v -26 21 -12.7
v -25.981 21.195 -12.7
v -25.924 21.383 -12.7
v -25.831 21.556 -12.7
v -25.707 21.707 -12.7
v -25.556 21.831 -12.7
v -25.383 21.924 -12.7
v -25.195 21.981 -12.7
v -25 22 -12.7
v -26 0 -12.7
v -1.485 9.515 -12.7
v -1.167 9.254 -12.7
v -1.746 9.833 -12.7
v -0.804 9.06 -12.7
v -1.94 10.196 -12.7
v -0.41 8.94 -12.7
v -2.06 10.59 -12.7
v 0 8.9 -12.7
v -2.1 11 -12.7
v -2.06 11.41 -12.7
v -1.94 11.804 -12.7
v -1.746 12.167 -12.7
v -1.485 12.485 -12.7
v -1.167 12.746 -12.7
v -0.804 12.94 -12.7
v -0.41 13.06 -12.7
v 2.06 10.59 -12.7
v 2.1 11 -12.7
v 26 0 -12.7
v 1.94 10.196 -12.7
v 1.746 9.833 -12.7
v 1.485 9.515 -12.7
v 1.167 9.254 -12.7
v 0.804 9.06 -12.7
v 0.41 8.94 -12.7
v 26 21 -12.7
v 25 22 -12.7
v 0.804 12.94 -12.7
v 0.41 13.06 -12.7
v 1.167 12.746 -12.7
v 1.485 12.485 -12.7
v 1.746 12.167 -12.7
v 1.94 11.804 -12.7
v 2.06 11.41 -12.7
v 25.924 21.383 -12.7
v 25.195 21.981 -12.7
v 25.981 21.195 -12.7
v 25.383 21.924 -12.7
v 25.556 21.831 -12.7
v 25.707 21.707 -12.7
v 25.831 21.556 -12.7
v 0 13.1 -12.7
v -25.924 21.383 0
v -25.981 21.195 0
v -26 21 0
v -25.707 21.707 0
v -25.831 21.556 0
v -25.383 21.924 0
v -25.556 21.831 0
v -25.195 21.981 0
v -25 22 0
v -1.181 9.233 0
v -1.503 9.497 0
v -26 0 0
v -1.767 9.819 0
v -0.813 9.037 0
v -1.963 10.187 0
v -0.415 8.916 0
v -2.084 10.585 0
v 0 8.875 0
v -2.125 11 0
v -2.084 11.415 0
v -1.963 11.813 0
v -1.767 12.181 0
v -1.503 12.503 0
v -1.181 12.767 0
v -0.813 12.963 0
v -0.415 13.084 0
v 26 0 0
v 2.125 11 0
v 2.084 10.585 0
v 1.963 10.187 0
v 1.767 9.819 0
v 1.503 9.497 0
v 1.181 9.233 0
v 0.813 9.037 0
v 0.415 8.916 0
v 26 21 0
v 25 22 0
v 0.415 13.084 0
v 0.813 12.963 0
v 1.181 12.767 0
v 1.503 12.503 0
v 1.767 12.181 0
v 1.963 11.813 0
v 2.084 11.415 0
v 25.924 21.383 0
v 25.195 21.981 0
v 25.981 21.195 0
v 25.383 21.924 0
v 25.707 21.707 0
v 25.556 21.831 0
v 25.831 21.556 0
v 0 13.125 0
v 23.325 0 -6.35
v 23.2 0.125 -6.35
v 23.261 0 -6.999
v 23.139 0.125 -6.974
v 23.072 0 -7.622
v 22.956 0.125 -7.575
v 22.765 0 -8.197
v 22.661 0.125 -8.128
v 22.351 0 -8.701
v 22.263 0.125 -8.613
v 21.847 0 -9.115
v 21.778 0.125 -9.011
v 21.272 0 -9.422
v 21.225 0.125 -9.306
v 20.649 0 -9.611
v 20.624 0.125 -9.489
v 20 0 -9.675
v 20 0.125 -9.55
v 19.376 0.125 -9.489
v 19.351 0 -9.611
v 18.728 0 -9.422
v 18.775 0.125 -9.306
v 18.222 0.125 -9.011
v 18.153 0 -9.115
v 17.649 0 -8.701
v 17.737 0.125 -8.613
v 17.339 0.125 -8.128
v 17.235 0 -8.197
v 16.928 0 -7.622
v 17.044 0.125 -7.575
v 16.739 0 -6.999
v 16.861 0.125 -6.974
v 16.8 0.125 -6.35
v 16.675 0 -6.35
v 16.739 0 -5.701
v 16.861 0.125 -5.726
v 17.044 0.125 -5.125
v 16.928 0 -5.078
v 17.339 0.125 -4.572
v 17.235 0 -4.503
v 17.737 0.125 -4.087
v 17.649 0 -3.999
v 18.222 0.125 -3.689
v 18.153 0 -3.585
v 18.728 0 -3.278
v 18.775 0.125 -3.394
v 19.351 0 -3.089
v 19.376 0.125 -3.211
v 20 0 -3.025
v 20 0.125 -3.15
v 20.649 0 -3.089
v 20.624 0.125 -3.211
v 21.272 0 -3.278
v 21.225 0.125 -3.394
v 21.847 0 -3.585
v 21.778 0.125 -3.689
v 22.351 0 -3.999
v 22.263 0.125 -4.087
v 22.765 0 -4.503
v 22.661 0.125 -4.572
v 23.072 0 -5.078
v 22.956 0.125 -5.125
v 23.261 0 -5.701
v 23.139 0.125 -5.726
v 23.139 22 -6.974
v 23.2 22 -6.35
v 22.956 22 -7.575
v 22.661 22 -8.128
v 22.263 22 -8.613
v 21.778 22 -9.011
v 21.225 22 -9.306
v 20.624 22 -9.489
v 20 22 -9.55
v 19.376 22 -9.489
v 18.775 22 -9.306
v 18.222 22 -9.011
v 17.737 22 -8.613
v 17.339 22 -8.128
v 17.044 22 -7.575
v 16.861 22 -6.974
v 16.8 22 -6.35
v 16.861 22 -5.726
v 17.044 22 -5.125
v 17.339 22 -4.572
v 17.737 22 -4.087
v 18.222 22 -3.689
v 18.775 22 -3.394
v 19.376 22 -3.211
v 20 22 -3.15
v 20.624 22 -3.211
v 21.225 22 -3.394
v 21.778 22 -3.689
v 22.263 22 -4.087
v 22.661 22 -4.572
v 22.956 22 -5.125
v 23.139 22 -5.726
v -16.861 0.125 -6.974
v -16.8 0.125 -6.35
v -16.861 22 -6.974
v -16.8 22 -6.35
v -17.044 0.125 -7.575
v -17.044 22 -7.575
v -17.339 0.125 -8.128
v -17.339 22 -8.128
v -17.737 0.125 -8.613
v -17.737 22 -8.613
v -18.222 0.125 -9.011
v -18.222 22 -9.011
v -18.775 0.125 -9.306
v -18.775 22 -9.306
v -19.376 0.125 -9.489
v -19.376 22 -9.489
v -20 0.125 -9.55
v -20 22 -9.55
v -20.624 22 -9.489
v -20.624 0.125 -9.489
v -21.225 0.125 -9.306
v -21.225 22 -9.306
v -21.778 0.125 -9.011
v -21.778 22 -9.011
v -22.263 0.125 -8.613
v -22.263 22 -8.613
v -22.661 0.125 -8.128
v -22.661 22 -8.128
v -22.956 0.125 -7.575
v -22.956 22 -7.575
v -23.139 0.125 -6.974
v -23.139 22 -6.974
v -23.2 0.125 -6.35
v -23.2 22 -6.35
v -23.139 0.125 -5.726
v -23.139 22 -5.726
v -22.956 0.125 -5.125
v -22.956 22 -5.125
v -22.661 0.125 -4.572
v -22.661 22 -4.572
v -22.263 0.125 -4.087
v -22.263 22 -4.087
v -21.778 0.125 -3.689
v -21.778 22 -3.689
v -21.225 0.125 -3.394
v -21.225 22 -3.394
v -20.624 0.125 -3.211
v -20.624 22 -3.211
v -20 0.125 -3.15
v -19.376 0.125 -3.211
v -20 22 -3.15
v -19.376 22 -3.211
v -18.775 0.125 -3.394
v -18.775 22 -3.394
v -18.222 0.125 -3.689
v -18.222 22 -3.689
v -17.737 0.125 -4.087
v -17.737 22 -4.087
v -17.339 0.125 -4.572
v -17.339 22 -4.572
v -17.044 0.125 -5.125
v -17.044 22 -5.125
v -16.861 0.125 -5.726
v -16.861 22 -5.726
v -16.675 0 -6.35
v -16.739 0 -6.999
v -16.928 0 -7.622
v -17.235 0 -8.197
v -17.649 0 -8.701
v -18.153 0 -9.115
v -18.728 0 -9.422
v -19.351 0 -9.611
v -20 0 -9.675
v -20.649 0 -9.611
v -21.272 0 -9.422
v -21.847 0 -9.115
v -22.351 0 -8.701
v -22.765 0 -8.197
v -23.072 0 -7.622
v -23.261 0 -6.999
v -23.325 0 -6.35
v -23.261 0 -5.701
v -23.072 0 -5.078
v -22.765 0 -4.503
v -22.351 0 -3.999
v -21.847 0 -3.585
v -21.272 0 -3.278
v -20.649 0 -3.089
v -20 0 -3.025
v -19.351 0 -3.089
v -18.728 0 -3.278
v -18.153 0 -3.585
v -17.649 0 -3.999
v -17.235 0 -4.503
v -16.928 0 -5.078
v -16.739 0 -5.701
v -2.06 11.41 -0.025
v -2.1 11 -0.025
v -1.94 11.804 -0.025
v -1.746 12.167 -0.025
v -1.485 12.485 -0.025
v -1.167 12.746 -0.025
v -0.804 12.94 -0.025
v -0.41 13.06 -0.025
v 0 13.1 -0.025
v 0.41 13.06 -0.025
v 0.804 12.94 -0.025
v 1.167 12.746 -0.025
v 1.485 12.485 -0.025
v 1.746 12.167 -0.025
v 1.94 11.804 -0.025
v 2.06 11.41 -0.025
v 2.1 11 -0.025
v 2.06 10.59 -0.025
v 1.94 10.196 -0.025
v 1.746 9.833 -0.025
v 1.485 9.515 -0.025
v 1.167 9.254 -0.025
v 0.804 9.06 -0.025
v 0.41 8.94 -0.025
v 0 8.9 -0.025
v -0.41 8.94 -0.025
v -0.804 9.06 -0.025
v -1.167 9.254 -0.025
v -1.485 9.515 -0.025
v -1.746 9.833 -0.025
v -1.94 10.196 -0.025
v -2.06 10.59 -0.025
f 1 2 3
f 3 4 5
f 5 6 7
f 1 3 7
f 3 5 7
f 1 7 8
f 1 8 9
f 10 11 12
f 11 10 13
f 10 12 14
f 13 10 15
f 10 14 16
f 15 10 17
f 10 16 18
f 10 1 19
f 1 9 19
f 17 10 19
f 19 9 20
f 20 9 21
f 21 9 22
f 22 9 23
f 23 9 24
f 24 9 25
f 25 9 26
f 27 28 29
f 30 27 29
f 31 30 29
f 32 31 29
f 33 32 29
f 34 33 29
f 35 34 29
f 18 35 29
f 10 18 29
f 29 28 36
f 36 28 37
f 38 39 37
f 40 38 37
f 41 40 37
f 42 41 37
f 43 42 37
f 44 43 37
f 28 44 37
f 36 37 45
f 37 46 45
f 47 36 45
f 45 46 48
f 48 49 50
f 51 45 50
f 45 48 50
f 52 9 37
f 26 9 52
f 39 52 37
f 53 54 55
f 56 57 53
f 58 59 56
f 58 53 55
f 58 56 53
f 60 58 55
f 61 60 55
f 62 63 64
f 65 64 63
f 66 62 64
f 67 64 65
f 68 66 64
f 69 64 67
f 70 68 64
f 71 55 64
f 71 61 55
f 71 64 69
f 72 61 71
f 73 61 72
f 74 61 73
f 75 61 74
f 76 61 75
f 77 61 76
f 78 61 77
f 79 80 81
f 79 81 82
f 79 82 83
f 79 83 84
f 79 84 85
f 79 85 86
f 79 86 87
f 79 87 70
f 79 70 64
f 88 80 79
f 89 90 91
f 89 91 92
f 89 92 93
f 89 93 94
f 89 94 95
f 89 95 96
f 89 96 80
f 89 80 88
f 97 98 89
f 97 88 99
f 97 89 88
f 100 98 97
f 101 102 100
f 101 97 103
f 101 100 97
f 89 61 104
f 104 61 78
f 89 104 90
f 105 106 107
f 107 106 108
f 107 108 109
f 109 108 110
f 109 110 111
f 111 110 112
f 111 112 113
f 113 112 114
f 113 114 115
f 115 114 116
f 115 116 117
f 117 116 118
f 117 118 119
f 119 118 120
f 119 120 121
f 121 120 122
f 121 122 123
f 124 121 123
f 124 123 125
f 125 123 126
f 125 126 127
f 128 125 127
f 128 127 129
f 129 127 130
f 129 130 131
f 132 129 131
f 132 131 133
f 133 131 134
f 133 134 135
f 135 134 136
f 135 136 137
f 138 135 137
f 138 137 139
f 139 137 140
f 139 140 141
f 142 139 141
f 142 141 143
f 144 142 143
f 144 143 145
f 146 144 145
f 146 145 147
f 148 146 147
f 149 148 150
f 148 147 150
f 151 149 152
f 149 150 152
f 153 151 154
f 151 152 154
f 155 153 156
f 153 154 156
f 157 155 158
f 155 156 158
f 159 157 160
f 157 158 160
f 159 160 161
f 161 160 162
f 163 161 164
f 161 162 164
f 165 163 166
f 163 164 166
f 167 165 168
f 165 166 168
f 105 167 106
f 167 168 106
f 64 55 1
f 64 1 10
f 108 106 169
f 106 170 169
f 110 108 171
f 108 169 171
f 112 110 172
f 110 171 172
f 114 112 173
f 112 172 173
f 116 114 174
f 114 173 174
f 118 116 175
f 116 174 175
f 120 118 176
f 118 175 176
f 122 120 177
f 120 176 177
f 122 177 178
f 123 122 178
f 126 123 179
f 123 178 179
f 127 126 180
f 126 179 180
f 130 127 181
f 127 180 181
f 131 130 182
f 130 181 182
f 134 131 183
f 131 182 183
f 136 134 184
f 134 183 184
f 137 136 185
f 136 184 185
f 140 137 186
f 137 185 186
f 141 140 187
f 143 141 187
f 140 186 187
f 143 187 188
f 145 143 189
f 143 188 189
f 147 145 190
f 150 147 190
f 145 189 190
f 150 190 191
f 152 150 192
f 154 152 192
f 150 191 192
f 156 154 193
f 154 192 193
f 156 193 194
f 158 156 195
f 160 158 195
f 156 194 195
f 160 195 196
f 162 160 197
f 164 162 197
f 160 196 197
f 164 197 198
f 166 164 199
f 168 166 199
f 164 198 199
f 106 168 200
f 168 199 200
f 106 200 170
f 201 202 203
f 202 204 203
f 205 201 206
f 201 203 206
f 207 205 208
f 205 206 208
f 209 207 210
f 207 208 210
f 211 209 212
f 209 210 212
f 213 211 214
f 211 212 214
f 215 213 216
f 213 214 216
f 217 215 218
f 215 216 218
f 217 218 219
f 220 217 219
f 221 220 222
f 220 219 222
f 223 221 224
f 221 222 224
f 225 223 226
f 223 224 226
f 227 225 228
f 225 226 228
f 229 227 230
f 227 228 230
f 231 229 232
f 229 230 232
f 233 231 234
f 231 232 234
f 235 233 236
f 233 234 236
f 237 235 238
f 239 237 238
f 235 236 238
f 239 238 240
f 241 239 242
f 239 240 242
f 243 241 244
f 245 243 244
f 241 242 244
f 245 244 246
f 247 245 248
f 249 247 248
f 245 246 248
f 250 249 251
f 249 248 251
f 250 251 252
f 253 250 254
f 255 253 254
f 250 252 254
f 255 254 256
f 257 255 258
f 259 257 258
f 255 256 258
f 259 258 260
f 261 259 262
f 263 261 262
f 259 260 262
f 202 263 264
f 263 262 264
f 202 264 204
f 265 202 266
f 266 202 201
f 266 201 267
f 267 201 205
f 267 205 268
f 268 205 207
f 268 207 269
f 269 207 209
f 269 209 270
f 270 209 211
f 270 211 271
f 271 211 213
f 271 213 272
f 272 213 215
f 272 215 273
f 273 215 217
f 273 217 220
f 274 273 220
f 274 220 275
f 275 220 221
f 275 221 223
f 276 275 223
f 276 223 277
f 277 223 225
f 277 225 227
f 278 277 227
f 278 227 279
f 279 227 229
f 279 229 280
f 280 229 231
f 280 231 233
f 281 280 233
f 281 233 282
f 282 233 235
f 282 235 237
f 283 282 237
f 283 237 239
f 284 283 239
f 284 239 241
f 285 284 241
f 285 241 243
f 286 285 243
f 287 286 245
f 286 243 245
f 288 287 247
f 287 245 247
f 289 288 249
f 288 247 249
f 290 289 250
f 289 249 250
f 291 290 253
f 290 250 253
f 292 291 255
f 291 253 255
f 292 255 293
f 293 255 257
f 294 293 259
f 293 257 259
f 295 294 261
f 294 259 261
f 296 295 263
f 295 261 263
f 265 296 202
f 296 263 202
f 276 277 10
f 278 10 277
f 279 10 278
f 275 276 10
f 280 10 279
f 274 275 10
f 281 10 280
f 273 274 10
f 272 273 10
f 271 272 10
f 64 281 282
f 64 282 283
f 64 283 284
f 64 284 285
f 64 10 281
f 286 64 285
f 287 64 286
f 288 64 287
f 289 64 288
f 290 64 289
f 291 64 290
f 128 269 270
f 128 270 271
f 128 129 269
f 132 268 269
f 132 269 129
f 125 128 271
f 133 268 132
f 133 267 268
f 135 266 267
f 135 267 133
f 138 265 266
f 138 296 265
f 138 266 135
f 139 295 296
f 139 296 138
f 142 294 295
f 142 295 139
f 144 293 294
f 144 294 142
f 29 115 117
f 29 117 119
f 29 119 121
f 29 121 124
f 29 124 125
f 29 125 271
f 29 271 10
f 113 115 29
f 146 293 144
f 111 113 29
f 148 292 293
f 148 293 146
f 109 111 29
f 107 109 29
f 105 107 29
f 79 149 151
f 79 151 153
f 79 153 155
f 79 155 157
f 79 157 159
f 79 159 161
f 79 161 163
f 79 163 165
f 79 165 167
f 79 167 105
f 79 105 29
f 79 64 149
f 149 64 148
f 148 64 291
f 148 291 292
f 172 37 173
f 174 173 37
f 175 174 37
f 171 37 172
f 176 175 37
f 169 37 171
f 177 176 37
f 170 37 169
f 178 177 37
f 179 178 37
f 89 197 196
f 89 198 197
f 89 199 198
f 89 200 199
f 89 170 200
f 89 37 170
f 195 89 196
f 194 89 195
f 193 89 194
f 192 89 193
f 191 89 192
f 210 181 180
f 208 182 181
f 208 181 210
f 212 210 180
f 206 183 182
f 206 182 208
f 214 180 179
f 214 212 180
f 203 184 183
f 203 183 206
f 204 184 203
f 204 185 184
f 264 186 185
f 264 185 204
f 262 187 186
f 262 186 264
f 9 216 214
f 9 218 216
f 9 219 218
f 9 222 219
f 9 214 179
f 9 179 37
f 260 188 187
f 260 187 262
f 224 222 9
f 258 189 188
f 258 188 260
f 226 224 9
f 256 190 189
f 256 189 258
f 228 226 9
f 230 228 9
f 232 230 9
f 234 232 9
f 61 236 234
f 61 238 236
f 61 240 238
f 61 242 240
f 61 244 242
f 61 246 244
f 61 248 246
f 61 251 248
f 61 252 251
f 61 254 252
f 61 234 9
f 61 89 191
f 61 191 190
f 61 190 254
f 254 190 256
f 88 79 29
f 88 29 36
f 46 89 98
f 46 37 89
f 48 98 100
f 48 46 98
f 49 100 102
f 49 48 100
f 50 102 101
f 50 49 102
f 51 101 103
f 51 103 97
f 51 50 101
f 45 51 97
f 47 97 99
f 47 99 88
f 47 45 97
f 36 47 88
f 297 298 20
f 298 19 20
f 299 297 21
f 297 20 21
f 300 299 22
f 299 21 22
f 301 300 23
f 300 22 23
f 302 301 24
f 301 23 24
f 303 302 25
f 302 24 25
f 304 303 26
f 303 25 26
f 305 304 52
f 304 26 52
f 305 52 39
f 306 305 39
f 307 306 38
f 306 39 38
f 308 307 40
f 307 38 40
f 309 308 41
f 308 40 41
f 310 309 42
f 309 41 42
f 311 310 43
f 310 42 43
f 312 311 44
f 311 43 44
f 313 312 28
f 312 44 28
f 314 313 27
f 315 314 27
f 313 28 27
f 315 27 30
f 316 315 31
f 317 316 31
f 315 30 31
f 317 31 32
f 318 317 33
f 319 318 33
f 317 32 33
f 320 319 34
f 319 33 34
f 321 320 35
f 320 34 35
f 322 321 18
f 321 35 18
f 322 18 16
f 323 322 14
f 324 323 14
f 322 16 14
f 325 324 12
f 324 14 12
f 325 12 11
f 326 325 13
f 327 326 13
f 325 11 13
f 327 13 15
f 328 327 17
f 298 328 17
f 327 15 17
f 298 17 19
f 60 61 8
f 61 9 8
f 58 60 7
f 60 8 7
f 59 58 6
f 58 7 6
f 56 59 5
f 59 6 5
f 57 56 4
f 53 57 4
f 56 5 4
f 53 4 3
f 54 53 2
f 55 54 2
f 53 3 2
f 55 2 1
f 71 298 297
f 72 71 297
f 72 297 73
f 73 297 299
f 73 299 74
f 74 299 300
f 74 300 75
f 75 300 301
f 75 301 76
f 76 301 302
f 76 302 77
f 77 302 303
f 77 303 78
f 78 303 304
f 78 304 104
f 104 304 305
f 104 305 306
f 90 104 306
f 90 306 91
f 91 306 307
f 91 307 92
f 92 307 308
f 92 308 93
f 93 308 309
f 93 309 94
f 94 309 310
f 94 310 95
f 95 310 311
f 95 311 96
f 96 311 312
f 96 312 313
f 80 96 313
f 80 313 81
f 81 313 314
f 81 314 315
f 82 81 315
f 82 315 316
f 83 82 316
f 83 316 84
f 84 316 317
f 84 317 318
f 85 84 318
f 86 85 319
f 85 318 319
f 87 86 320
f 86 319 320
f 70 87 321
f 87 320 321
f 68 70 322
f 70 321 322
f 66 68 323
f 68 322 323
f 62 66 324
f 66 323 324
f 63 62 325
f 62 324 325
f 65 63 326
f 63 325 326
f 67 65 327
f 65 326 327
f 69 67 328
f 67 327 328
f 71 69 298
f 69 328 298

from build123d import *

# Parameters (mm, degrees)
BOSS_EXTRUDE1_DEPTH                   = 12.7
TAP_DRILL_FOR_M5X0_8_TAP1_D           = 4.2
TAP_DRILL_FOR_M5X0_8_TAP1_CSINK_D     = 4.25
TAP_DRILL_FOR_M5X0_8_TAP1_CSINK_ANGLE = 90
M6_CLEARANCE_HOLE1_D                  = 6.4
M6_CLEARANCE_HOLE1_CSINK_D            = 6.65
M6_CLEARANCE_HOLE1_CSINK_ANGLE        = 90
FILLET1_R                             = 1


with BuildPart() as part:
    # Sketch1 → Boss-Extrude1 (new body)
    with BuildSketch(Plane.XY):
        Polygon((-26, 0), (26, 0), (26, 6), (26, 22), (7.5, 22), (-7.5, 22), (-26, 22), (-26, 6), align=None)
    extrude(amount=-BOSS_EXTRUDE1_DEPTH)

    # Tap Drill for M5x0.8 Tap1 (through all)
    with Locations(Plane(origin=(0, 11, 0), x_dir=(1, 0, 0), z_dir=(0, 0, 1))):
        with Locations((0, 0)):
            CounterSinkHole(TAP_DRILL_FOR_M5X0_8_TAP1_D / 2, TAP_DRILL_FOR_M5X0_8_TAP1_CSINK_D / 2, counter_sink_angle=TAP_DRILL_FOR_M5X0_8_TAP1_CSINK_ANGLE)

    # M6 Clearance Hole1 (through all)
    with Locations(Plane(origin=(-20, 0, -6.35), x_dir=(-1, 0, 0), z_dir=(0, -1, 0))):
        with Locations((0, 0), (-40, 0)):
            CounterSinkHole(M6_CLEARANCE_HOLE1_D / 2, M6_CLEARANCE_HOLE1_CSINK_D / 2, counter_sink_angle=M6_CLEARANCE_HOLE1_CSINK_ANGLE)

    # Fillet1
    fillet1_edges = [part.edges().sort_by_distance(p)[0] for p in [
        (-26, 22, -6.35),
        (26, 22, -6.35),
    ]]
    fillet(fillet1_edges, radius=FILLET1_R)


solid = part.part
